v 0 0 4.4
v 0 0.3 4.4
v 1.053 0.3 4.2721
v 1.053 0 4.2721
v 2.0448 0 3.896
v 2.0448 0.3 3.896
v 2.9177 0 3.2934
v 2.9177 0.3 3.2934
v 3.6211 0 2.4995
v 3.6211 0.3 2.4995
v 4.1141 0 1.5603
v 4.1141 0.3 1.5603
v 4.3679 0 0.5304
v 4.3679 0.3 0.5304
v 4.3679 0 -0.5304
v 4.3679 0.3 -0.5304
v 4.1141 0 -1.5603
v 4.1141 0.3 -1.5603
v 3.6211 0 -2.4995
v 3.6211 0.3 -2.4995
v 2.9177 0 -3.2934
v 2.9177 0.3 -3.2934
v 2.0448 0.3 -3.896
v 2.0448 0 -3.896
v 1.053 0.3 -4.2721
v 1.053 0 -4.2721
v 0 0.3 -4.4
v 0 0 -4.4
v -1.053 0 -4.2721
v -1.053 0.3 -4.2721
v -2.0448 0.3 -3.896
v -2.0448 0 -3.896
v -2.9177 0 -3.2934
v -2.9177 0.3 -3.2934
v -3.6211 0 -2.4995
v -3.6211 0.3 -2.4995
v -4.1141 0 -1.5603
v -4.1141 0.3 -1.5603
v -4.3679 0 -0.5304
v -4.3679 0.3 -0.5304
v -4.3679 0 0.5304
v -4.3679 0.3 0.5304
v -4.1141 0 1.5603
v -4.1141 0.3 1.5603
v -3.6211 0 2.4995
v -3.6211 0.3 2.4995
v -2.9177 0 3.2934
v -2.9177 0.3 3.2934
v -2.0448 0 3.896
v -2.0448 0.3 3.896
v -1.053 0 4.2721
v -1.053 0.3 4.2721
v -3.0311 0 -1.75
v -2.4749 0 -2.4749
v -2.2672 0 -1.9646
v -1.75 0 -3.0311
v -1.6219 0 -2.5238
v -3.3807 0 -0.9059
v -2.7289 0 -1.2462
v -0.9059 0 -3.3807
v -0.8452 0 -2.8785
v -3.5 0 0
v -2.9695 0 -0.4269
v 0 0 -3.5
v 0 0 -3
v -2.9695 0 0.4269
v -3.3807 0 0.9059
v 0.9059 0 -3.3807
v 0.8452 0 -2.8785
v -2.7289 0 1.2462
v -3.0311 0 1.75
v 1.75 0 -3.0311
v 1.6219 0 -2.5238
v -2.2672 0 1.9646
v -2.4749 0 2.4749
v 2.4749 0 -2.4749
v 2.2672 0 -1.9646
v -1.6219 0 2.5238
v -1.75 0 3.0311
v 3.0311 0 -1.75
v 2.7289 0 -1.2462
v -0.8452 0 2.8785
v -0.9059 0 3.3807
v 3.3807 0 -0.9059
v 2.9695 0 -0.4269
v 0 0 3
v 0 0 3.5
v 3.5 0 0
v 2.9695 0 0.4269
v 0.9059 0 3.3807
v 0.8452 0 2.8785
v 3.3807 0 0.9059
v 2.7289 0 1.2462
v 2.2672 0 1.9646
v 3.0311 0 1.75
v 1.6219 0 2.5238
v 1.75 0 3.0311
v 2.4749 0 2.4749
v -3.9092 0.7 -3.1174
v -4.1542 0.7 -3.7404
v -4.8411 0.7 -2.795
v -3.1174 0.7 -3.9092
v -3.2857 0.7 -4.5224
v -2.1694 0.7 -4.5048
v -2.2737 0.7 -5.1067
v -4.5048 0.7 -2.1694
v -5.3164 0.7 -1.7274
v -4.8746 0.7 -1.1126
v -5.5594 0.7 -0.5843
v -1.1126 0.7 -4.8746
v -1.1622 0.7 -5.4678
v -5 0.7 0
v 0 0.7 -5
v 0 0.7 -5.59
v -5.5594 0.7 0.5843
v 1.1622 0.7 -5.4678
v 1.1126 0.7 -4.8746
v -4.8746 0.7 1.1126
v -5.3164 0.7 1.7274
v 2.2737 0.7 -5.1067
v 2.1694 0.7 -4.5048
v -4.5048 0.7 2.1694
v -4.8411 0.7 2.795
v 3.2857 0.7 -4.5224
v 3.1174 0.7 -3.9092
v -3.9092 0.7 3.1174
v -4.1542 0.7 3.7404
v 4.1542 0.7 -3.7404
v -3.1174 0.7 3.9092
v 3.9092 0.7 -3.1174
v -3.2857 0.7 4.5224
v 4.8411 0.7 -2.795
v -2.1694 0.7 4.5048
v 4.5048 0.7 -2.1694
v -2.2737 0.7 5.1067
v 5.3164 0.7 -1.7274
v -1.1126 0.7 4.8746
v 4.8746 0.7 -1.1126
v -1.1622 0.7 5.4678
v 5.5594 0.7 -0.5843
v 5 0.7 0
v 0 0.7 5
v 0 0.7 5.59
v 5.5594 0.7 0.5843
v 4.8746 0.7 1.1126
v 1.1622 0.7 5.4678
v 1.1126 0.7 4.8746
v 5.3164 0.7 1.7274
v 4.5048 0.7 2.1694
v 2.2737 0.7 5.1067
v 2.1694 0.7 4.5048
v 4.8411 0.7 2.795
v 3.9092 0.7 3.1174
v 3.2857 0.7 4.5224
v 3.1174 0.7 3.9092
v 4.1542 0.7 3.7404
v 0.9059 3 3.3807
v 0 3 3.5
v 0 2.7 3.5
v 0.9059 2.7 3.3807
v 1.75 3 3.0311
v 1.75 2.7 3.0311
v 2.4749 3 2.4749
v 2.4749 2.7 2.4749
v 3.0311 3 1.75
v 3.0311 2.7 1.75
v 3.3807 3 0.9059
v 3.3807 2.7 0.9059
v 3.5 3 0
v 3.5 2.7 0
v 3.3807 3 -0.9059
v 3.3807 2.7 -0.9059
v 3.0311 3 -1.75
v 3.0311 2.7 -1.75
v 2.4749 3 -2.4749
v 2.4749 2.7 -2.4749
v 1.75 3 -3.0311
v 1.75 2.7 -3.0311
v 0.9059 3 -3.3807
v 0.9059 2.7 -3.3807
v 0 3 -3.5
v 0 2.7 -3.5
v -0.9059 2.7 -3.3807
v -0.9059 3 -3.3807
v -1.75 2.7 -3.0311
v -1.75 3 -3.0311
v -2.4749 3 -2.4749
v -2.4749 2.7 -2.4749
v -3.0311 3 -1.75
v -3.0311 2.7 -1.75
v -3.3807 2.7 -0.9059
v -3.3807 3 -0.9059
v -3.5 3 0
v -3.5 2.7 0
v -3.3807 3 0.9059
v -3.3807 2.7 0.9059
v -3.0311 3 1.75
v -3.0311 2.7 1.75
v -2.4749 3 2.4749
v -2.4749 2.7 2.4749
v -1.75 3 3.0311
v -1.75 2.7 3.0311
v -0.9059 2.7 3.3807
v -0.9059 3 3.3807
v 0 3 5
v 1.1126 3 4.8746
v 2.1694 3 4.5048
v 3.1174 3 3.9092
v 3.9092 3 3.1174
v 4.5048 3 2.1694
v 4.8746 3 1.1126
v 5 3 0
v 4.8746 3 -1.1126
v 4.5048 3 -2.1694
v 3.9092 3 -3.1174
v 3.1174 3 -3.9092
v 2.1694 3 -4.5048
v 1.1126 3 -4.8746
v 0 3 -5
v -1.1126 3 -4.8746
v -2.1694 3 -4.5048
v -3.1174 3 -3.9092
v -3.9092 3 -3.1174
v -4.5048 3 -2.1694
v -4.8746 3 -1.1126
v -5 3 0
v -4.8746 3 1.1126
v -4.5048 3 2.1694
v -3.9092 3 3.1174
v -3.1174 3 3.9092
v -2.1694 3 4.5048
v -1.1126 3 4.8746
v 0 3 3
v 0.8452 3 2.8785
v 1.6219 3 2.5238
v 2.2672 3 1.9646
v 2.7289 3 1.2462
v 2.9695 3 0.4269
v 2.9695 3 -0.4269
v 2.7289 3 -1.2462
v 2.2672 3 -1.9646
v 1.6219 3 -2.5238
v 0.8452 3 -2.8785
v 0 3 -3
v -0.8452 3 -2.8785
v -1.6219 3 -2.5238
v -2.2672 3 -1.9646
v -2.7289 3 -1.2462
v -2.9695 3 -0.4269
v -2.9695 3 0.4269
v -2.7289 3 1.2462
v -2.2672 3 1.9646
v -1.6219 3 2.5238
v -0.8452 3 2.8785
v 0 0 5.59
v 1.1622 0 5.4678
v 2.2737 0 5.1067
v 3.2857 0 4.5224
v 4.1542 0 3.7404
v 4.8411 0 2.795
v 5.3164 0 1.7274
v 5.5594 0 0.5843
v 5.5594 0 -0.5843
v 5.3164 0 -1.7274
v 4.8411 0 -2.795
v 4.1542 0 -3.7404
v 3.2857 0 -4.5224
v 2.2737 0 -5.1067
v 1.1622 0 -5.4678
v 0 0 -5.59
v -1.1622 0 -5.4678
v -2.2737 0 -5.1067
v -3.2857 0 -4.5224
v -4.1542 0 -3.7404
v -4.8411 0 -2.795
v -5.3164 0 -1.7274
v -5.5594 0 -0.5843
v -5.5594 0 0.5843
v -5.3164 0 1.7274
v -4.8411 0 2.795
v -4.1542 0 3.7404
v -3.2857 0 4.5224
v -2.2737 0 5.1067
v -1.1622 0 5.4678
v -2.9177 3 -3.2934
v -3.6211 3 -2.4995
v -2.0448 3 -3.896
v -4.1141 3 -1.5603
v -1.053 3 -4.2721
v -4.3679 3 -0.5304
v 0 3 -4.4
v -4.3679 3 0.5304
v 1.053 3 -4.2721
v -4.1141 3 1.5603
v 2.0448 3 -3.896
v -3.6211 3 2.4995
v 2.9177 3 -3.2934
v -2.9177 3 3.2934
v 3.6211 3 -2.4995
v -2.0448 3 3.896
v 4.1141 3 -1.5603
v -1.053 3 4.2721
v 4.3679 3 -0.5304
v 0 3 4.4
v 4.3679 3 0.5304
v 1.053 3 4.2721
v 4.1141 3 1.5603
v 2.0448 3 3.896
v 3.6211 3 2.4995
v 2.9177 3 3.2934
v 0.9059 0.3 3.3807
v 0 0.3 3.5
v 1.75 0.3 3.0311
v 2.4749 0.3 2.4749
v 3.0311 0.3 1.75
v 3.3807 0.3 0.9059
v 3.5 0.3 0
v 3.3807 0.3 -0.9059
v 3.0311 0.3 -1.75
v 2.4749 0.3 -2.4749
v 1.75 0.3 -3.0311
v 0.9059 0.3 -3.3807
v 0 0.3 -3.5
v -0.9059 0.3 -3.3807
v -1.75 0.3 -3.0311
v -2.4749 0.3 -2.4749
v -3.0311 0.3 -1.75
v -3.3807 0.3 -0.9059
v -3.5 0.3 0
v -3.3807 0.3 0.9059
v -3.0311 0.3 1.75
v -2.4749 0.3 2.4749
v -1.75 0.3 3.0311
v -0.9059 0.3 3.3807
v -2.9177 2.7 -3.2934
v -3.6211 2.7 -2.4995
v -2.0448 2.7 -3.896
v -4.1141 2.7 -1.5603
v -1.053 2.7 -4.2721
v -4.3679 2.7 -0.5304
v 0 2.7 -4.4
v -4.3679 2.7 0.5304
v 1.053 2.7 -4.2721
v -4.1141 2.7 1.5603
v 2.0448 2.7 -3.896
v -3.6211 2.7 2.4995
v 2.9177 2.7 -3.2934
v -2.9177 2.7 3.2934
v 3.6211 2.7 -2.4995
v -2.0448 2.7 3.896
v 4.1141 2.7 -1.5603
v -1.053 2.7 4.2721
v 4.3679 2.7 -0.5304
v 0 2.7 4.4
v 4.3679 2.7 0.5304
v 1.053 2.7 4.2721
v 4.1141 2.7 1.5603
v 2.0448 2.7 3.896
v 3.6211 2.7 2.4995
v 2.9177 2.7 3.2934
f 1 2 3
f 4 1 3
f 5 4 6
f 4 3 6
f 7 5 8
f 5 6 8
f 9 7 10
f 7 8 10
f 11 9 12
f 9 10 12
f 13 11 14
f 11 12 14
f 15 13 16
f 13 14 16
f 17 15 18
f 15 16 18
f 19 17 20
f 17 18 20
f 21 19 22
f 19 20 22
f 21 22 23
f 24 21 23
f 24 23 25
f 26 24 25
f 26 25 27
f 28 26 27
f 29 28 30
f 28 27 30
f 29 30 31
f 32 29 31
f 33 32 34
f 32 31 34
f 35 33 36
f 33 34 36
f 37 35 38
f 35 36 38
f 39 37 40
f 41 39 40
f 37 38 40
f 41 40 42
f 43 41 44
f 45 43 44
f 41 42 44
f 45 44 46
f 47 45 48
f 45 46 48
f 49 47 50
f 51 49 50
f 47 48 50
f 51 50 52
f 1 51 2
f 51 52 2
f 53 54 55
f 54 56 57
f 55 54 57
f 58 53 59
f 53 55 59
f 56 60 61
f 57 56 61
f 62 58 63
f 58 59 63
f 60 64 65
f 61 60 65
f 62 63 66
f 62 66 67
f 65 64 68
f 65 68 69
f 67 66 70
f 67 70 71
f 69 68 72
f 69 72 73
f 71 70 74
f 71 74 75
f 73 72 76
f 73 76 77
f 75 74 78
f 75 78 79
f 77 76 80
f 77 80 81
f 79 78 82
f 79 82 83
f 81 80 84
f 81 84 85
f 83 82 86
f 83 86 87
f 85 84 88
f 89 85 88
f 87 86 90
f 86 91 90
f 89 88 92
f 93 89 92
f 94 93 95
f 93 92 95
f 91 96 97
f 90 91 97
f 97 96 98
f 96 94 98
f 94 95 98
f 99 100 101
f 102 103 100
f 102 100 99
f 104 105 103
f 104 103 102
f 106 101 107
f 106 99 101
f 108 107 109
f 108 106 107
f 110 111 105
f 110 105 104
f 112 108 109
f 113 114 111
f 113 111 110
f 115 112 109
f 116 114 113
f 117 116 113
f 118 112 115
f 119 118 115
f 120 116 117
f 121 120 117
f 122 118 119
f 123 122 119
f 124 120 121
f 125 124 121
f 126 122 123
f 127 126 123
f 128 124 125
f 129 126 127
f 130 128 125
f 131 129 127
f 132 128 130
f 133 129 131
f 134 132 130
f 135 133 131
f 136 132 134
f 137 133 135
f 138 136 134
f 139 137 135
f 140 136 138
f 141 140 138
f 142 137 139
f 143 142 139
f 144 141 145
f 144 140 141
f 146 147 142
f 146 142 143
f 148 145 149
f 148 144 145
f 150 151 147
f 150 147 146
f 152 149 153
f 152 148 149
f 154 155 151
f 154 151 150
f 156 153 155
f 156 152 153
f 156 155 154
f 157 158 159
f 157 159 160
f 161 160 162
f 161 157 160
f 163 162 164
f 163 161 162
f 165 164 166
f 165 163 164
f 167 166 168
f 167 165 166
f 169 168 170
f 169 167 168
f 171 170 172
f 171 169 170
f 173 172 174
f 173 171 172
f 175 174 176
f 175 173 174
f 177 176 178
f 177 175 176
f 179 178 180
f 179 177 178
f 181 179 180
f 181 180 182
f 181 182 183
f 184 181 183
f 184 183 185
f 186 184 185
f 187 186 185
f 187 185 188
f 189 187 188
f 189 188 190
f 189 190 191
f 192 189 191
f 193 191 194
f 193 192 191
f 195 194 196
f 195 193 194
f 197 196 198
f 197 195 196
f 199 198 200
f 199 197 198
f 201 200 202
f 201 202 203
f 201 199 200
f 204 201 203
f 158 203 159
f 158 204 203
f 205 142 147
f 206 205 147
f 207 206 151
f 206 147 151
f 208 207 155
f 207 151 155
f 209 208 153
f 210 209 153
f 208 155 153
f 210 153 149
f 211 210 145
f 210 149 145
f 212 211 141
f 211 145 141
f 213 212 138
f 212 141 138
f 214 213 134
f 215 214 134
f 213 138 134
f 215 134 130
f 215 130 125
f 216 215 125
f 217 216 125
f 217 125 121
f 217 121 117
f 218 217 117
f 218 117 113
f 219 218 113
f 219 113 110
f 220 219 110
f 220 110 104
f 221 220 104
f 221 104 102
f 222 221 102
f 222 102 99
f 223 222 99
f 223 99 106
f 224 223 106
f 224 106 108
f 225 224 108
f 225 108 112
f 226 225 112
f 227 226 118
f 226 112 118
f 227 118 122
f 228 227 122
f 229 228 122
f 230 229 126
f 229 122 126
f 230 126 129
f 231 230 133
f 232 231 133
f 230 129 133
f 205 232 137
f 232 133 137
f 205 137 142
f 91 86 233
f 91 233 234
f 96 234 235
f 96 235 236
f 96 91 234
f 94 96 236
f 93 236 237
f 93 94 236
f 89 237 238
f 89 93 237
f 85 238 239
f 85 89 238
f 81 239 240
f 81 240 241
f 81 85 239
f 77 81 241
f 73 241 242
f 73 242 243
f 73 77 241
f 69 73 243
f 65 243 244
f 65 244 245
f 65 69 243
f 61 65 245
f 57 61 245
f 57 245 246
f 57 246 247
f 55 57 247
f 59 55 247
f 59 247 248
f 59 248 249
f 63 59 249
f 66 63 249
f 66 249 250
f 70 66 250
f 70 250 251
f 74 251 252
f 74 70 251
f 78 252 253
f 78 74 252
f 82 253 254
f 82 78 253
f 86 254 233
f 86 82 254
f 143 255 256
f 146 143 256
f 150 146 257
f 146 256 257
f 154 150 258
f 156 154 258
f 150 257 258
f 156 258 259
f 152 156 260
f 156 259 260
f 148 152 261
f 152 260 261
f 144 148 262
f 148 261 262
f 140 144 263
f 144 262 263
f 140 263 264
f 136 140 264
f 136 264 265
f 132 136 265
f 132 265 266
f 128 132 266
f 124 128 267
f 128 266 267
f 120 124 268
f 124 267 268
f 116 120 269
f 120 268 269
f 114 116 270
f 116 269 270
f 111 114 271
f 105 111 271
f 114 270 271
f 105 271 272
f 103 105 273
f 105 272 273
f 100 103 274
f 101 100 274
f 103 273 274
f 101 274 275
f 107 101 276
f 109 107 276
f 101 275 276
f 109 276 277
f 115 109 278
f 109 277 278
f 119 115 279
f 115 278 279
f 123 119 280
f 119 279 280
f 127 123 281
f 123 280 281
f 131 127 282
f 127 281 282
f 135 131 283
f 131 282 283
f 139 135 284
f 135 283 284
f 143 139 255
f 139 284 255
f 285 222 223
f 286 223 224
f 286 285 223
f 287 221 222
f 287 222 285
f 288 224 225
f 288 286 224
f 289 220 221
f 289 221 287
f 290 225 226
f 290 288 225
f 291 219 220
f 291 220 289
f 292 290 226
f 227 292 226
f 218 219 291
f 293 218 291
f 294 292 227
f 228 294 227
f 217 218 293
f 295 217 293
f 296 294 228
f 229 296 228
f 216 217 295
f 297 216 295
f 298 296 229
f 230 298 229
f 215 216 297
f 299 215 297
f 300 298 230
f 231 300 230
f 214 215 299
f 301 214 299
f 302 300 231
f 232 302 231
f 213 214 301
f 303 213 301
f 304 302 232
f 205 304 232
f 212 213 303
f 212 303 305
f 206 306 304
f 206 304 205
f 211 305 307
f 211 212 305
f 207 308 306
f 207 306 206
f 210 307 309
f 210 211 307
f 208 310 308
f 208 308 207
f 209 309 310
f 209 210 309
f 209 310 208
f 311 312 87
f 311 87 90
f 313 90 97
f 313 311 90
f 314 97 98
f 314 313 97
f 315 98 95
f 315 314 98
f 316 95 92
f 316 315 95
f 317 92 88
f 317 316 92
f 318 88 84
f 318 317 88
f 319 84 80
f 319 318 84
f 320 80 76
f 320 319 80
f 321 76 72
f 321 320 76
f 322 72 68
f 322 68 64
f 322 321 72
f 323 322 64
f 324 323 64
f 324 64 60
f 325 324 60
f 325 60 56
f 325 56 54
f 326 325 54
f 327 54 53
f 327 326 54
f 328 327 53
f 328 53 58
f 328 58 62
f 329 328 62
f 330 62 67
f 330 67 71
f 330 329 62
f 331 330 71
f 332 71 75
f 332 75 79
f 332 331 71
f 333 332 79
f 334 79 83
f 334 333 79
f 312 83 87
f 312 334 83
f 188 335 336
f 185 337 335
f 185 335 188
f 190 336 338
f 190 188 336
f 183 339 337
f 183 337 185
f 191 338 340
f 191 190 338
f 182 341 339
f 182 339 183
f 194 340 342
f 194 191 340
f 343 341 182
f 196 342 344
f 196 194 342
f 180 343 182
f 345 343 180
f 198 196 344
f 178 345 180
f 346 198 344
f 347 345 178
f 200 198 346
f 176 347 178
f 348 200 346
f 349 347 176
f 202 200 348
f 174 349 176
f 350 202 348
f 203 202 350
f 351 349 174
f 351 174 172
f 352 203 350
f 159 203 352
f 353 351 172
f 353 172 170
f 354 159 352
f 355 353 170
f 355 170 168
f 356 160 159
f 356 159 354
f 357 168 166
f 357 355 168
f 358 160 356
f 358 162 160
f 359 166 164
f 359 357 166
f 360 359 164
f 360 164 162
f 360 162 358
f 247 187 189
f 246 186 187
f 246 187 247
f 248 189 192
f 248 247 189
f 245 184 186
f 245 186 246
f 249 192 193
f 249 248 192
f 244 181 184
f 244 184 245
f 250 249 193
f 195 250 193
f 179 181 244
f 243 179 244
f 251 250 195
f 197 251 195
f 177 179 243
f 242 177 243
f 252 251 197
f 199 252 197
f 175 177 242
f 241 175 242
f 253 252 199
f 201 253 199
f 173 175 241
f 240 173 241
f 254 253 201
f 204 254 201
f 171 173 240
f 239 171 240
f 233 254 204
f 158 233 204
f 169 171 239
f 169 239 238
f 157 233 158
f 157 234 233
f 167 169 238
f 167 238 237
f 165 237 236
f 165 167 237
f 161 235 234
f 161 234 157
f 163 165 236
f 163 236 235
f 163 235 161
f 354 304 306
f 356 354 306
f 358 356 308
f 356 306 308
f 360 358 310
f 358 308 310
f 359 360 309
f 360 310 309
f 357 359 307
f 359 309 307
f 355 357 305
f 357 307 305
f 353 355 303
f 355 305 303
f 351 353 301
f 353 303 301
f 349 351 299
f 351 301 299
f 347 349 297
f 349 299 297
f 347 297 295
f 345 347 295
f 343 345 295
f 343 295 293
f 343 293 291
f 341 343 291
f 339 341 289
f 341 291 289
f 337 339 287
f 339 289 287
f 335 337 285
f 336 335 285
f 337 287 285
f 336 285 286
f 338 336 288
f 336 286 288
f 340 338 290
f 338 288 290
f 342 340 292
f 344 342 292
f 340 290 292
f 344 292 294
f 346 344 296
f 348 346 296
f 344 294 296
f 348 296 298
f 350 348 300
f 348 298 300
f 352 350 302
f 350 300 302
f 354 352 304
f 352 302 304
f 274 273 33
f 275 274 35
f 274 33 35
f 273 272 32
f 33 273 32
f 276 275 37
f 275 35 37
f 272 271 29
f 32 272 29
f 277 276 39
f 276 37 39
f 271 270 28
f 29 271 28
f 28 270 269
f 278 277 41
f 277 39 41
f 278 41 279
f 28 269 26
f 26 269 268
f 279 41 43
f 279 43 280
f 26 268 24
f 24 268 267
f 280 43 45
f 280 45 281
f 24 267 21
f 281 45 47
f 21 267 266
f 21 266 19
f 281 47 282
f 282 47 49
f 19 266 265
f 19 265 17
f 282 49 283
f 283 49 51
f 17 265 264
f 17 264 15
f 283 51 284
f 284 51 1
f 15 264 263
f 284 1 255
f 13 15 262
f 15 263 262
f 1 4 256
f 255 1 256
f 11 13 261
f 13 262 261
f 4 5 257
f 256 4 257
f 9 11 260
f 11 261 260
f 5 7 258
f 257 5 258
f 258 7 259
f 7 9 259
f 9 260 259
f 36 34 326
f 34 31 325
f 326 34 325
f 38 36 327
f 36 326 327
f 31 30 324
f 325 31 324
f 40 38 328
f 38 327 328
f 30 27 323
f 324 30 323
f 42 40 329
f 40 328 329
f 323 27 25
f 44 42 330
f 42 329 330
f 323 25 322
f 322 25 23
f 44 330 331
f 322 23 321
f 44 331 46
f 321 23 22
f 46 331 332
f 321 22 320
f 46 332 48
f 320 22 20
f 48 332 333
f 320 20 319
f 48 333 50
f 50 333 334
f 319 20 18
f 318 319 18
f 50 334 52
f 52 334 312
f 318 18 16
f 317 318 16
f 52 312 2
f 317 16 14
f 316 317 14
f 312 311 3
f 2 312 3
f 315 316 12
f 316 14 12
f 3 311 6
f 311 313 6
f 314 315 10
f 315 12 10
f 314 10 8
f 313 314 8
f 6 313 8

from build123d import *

# Parameters (mm, degrees)
SKETCH1_R           = 5
SKETCH1_R_2         = 3
BOSS_EXTRUDE1_DEPTH = 3
SKETCH2_R           = 5.59
SKETCH2_R_2         = 5
BOSS_EXTRUDE2_DEPTH = 0.7
SKETCH3_R           = 4.4
SKETCH3_R_2         = 3.5
CUT_EXTRUDE1_DEPTH  = 0.3
CUT_EXTRUDE2_START  = 0.3
SKETCH4_R           = 4.4
SKETCH4_R_2         = 3.5
CUT_EXTRUDE2_DEPTH  = 0.3


with BuildPart() as part:
    # Sketch1 → Boss-Extrude1 (new body)
    with BuildSketch(Plane(origin=(0, 0, 0), x_dir=(1, 0, 0), z_dir=(0, 1, 0))):
        with Locations(Location((0, 0, 0), (0, 0, 270))):
            Circle(SKETCH1_R)
        with Locations(Location((0, 0, 0), (0, 0, 270))):
            Circle(SKETCH1_R_2, mode=Mode.SUBTRACT)
    extrude(amount=BOSS_EXTRUDE1_DEPTH)

    # Sketch2 → Boss-Extrude2 (add)
    with BuildSketch(Plane(origin=(0, 0, 0), x_dir=(1, 0, 0), z_dir=(0, 1, 0))):
        with Locations(Location((0, 0, 0), (0, 0, 270))):
            Circle(SKETCH2_R)
        with Locations(Location((0, 0, 0), (0, 0, 270))):
            Circle(SKETCH2_R_2, mode=Mode.SUBTRACT)
    extrude(amount=BOSS_EXTRUDE2_DEPTH)

    # Sketch3 → Cut-Extrude1 (cut)
    with BuildSketch(Plane(origin=(0, 3, 0), x_dir=(1, 0, 0), z_dir=(0, 1, 0))):
        with Locations(Location((0, 0, 0), (0, 0, 270))):
            Circle(SKETCH3_R)
        with Locations(Location((0, 0, 0), (0, 0, 270))):
            Circle(SKETCH3_R_2, mode=Mode.SUBTRACT)
    extrude(amount=-CUT_EXTRUDE1_DEPTH, mode=Mode.SUBTRACT)

    # Sketch4 → Cut-Extrude2 (cut)
    with BuildSketch(Plane(origin=(0, 0, 0), x_dir=(1, 0, 0), z_dir=(0, 1, 0)).offset(CUT_EXTRUDE2_START)):
        with Locations(Location((0, 0, 0), (0, 0, 270))):
            Circle(SKETCH4_R)
        with Locations(Location((0, 0, 0), (0, 0, 270))):
            Circle(SKETCH4_R_2, mode=Mode.SUBTRACT)
    extrude(amount=-CUT_EXTRUDE2_DEPTH, mode=Mode.SUBTRACT)


solid = part.part
